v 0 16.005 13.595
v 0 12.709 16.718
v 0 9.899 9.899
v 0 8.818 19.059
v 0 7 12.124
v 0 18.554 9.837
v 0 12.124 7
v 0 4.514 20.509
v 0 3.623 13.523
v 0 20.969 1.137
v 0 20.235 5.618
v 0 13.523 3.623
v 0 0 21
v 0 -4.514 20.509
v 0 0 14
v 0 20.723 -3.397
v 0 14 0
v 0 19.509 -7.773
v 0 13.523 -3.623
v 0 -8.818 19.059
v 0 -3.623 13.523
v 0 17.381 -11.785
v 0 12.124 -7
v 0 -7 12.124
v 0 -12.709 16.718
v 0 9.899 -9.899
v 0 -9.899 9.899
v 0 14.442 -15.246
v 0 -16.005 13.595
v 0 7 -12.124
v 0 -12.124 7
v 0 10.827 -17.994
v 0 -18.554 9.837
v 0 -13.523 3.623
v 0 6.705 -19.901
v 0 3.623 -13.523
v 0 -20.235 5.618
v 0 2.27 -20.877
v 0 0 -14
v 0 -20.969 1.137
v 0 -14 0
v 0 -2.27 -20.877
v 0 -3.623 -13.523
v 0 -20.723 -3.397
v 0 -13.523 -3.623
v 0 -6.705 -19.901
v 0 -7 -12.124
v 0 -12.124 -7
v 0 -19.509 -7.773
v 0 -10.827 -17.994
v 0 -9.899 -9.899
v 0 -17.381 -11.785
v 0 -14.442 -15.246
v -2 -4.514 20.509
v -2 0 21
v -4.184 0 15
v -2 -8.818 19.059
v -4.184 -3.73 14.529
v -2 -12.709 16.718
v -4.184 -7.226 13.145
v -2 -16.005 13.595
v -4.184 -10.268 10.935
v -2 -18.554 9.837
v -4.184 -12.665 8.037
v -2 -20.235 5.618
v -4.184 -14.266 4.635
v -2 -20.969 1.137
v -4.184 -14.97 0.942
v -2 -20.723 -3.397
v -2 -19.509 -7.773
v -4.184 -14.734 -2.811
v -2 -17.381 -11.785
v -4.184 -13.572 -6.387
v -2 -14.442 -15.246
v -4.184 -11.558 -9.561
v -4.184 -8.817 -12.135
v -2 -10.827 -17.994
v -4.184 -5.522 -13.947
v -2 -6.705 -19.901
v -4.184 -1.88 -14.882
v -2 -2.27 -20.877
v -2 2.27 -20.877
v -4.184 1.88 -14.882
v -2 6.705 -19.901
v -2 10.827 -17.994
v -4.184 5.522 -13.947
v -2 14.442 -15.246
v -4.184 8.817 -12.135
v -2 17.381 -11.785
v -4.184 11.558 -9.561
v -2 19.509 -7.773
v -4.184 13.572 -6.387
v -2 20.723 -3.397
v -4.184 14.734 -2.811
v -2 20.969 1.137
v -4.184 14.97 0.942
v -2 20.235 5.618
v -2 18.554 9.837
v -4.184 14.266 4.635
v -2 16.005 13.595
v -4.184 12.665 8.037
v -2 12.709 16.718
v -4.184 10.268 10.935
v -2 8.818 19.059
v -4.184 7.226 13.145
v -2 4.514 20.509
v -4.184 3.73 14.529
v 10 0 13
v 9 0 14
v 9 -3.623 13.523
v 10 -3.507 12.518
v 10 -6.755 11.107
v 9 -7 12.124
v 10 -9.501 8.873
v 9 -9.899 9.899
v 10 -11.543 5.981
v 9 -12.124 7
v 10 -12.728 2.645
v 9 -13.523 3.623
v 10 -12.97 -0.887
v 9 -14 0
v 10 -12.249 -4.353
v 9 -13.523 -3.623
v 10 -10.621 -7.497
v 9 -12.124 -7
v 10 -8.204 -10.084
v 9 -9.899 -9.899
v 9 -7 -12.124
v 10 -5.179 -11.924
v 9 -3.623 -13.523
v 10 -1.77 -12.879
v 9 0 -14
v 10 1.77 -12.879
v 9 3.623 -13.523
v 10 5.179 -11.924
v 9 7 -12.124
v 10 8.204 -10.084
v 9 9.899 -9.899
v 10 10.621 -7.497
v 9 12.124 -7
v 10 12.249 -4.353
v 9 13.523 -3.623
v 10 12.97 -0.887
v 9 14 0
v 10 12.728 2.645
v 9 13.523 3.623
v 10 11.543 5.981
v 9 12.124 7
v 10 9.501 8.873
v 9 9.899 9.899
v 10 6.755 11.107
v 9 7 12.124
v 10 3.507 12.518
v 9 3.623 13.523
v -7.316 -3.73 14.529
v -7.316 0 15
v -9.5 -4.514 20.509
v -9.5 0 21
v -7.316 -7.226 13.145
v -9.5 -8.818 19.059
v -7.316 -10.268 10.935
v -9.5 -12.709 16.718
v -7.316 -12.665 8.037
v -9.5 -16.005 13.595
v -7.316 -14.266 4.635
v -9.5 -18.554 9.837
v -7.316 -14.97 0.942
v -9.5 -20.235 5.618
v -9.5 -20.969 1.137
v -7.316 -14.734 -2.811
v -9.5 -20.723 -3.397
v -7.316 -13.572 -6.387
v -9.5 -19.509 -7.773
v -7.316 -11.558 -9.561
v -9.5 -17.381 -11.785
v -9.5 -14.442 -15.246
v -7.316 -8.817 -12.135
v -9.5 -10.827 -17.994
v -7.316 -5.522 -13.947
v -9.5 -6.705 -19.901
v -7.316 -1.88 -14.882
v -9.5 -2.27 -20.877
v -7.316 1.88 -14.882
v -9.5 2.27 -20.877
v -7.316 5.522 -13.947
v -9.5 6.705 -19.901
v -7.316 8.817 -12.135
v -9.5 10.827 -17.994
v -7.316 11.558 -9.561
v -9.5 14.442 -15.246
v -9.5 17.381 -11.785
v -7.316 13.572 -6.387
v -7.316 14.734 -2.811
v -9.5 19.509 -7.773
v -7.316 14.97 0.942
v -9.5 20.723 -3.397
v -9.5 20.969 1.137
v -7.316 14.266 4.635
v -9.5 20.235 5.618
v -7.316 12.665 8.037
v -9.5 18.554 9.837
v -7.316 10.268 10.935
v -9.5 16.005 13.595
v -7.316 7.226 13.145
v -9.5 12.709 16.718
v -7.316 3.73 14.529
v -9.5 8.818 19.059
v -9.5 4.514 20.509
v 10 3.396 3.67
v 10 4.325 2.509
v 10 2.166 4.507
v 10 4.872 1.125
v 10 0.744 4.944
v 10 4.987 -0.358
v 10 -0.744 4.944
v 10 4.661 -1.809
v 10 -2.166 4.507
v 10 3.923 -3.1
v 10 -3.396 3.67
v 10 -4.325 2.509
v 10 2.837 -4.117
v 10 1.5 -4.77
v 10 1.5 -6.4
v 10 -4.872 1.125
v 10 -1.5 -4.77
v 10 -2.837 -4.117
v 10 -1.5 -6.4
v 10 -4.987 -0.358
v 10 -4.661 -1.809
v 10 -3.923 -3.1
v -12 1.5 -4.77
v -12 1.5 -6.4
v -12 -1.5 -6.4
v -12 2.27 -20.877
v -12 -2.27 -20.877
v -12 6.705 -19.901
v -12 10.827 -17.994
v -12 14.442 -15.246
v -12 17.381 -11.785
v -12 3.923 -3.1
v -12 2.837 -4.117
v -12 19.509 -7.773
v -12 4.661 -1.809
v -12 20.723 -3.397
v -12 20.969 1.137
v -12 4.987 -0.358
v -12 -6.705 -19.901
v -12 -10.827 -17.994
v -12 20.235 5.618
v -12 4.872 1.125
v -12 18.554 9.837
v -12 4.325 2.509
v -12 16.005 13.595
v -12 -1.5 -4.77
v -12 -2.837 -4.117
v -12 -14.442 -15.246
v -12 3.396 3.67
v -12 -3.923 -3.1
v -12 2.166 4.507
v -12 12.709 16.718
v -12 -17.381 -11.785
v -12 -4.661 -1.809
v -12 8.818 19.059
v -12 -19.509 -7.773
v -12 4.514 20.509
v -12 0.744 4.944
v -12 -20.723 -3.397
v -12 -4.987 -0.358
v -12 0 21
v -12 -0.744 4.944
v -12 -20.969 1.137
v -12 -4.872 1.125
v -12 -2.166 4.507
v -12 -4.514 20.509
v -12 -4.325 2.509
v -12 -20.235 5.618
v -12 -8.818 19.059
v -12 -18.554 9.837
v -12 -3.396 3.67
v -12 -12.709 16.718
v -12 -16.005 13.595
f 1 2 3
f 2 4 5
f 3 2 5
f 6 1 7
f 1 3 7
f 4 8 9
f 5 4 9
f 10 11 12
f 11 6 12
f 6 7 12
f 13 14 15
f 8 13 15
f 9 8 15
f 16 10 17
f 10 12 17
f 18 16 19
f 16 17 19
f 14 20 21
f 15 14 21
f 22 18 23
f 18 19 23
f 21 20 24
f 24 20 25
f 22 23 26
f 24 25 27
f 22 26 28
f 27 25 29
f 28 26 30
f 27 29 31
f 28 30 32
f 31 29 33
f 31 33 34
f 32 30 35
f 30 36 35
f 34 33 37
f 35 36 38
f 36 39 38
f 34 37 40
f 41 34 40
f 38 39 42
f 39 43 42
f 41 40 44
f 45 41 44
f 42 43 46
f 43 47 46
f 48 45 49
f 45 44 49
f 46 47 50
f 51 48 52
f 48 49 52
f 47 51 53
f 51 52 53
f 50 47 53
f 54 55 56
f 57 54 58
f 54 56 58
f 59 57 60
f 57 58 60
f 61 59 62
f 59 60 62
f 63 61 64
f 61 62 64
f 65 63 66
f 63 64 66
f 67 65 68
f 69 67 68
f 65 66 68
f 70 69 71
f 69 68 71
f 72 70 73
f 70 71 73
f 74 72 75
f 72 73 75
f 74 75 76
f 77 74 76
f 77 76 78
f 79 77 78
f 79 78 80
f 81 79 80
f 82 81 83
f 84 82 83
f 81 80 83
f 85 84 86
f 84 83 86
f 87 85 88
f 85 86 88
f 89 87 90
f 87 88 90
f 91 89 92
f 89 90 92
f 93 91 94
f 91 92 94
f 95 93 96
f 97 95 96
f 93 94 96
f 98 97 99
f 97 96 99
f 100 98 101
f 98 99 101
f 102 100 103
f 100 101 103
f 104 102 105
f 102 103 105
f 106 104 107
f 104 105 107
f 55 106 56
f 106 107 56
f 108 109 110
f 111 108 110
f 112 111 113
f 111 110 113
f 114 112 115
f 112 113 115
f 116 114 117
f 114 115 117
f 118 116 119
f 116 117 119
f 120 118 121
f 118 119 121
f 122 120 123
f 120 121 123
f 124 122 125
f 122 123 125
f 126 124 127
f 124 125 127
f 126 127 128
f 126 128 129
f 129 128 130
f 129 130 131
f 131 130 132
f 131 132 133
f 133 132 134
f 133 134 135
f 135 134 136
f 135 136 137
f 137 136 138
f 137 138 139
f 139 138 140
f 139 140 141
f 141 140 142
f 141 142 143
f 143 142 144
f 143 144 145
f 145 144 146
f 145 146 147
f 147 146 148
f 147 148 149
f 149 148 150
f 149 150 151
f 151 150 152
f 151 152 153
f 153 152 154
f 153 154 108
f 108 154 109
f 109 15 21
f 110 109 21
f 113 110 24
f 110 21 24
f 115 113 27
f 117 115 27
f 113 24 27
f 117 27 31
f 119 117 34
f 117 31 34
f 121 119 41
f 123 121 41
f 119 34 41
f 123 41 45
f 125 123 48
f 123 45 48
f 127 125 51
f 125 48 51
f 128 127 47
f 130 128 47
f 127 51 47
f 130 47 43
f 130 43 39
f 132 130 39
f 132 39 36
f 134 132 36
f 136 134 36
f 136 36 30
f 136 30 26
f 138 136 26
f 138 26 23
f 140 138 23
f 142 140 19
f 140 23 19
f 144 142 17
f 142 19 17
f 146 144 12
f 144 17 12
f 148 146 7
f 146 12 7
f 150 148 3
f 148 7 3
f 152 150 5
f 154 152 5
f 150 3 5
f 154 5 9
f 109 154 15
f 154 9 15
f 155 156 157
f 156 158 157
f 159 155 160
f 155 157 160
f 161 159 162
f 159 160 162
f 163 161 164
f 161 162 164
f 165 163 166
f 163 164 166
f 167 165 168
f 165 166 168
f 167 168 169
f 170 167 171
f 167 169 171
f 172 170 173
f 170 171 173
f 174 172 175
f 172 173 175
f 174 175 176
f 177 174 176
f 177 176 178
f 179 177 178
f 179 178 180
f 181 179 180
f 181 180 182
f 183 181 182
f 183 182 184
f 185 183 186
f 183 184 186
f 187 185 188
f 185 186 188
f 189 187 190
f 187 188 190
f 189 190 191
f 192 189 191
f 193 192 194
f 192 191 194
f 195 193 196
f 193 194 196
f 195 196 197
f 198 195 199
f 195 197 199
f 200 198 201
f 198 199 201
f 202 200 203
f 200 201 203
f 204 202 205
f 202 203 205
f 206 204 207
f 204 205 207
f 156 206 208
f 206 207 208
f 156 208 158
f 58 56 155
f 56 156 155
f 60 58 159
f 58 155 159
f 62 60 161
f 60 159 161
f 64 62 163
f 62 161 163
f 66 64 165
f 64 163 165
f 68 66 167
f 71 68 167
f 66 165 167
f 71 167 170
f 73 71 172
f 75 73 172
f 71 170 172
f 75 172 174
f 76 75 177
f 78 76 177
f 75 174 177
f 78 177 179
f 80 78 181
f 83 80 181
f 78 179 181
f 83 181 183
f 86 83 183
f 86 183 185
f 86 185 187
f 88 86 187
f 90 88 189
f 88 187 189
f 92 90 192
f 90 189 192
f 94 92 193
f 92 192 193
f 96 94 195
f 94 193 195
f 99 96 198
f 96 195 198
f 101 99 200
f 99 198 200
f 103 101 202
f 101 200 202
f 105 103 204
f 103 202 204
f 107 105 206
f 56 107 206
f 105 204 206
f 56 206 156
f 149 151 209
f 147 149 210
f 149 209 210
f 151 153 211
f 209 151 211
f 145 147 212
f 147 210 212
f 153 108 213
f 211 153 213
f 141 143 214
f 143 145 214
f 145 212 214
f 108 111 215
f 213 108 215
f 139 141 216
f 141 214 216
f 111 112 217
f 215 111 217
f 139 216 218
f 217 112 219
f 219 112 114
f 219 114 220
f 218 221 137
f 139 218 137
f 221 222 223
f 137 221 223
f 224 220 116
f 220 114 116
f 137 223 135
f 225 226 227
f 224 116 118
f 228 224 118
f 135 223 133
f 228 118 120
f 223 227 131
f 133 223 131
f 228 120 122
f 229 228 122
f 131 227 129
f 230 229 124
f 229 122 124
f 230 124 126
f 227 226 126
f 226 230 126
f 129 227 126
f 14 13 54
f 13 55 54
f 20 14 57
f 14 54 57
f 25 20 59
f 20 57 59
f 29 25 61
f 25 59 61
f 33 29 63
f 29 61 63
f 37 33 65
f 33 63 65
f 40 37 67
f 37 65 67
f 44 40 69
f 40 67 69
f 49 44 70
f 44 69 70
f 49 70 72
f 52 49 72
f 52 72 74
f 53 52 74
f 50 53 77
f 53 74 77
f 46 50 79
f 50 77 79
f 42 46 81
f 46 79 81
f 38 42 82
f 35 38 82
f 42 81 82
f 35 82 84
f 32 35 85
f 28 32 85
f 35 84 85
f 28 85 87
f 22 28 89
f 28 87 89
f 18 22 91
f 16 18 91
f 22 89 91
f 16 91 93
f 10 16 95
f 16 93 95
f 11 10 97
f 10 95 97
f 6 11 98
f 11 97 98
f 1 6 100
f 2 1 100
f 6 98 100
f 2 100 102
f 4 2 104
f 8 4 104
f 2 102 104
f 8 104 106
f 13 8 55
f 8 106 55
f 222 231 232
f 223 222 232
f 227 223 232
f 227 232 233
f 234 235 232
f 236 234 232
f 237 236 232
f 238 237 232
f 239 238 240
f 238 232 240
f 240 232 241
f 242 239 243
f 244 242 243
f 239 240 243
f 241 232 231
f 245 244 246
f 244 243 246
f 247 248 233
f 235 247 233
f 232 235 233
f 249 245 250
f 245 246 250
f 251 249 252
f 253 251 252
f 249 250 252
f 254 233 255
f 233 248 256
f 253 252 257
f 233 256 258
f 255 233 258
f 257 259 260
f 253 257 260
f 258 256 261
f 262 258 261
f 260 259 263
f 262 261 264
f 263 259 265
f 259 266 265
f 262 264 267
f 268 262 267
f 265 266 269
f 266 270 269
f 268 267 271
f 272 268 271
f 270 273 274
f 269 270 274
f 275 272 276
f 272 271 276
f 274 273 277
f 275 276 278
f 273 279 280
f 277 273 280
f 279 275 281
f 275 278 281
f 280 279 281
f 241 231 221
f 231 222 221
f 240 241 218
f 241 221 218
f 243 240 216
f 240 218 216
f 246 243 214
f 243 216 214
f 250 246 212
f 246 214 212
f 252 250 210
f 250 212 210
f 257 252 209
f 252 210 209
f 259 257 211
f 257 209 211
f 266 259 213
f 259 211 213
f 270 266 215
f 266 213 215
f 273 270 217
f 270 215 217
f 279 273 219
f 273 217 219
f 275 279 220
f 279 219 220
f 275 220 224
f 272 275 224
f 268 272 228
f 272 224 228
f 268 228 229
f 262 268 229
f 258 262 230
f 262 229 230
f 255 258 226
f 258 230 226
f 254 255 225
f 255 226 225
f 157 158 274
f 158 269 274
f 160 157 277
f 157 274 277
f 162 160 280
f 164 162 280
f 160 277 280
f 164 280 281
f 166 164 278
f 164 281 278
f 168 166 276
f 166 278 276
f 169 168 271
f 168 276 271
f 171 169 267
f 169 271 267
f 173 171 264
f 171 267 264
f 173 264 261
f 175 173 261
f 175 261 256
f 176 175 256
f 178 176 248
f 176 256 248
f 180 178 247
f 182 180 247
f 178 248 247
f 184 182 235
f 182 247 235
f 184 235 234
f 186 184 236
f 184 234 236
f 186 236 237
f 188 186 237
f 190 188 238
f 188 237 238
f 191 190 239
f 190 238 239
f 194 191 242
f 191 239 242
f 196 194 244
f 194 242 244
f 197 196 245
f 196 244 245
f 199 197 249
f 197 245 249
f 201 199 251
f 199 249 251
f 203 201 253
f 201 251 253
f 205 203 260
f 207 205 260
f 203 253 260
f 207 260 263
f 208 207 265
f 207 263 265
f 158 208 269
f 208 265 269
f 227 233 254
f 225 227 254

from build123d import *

# Parameters (mm, degrees)
CHAMFER1_SIZE      = 1
CUT_EXTRUDE1_REACH = 38.959


with BuildPart() as part:
    # Sketch1 → Revolve1 (revolve)
    with BuildSketch(Plane.XY, mode=Mode.PRIVATE) as revolve1_sk:
        Polygon((-12, 5), (10, 5), (10, 14), (0, 14), (0, 21), (-2, 21), (-4.183821406, 15), (-7.316178594, 15), (-9.5, 21), (-12, 21), align=None)
    revolve(revolve1_sk.sketch.rotate(Axis((-92.477937902, 0, 0), (1, 0, 0)), 90), axis=Axis((-92.477937902, 0, 0), (1, 0, 0)))

    # Chamfer1
    chamfer1_edges = [part.edges().sort_by_distance(p)[0] for p in [
        (10, 0, -14),
    ]]
    chamfer(chamfer1_edges, length=CHAMFER1_SIZE)

    # Sketch2 → Cut-Extrude1 (cut, up to next)
    with BuildSketch(Plane(origin=(10, 0, 0), x_dir=(0, 0, -1), z_dir=(1, 0, 0)), mode=Mode.PRIVATE) as cut_extrude1_sk1:
        with BuildLine():
            Line((4.769696007, 1.5), (6.4, 1.5))
            Line((6.4, 1.5), (6.4, -1.5))
            Line((6.4, -1.5), (4.769696007, -1.5))
            ThreePointArc((4.769696007, -1.5), (5, 0), (4.769696007, 1.5))
        make_face()
    cut_extrude1_tool1 = extrude(cut_extrude1_sk1.sketch, amount=-CUT_EXTRUDE1_REACH, mode=Mode.PRIVATE) & part.part
    add(cut_extrude1_tool1.solids().sort_by_distance((10, 0, -5.660391))[0], mode=Mode.SUBTRACT)


solid = part.part
